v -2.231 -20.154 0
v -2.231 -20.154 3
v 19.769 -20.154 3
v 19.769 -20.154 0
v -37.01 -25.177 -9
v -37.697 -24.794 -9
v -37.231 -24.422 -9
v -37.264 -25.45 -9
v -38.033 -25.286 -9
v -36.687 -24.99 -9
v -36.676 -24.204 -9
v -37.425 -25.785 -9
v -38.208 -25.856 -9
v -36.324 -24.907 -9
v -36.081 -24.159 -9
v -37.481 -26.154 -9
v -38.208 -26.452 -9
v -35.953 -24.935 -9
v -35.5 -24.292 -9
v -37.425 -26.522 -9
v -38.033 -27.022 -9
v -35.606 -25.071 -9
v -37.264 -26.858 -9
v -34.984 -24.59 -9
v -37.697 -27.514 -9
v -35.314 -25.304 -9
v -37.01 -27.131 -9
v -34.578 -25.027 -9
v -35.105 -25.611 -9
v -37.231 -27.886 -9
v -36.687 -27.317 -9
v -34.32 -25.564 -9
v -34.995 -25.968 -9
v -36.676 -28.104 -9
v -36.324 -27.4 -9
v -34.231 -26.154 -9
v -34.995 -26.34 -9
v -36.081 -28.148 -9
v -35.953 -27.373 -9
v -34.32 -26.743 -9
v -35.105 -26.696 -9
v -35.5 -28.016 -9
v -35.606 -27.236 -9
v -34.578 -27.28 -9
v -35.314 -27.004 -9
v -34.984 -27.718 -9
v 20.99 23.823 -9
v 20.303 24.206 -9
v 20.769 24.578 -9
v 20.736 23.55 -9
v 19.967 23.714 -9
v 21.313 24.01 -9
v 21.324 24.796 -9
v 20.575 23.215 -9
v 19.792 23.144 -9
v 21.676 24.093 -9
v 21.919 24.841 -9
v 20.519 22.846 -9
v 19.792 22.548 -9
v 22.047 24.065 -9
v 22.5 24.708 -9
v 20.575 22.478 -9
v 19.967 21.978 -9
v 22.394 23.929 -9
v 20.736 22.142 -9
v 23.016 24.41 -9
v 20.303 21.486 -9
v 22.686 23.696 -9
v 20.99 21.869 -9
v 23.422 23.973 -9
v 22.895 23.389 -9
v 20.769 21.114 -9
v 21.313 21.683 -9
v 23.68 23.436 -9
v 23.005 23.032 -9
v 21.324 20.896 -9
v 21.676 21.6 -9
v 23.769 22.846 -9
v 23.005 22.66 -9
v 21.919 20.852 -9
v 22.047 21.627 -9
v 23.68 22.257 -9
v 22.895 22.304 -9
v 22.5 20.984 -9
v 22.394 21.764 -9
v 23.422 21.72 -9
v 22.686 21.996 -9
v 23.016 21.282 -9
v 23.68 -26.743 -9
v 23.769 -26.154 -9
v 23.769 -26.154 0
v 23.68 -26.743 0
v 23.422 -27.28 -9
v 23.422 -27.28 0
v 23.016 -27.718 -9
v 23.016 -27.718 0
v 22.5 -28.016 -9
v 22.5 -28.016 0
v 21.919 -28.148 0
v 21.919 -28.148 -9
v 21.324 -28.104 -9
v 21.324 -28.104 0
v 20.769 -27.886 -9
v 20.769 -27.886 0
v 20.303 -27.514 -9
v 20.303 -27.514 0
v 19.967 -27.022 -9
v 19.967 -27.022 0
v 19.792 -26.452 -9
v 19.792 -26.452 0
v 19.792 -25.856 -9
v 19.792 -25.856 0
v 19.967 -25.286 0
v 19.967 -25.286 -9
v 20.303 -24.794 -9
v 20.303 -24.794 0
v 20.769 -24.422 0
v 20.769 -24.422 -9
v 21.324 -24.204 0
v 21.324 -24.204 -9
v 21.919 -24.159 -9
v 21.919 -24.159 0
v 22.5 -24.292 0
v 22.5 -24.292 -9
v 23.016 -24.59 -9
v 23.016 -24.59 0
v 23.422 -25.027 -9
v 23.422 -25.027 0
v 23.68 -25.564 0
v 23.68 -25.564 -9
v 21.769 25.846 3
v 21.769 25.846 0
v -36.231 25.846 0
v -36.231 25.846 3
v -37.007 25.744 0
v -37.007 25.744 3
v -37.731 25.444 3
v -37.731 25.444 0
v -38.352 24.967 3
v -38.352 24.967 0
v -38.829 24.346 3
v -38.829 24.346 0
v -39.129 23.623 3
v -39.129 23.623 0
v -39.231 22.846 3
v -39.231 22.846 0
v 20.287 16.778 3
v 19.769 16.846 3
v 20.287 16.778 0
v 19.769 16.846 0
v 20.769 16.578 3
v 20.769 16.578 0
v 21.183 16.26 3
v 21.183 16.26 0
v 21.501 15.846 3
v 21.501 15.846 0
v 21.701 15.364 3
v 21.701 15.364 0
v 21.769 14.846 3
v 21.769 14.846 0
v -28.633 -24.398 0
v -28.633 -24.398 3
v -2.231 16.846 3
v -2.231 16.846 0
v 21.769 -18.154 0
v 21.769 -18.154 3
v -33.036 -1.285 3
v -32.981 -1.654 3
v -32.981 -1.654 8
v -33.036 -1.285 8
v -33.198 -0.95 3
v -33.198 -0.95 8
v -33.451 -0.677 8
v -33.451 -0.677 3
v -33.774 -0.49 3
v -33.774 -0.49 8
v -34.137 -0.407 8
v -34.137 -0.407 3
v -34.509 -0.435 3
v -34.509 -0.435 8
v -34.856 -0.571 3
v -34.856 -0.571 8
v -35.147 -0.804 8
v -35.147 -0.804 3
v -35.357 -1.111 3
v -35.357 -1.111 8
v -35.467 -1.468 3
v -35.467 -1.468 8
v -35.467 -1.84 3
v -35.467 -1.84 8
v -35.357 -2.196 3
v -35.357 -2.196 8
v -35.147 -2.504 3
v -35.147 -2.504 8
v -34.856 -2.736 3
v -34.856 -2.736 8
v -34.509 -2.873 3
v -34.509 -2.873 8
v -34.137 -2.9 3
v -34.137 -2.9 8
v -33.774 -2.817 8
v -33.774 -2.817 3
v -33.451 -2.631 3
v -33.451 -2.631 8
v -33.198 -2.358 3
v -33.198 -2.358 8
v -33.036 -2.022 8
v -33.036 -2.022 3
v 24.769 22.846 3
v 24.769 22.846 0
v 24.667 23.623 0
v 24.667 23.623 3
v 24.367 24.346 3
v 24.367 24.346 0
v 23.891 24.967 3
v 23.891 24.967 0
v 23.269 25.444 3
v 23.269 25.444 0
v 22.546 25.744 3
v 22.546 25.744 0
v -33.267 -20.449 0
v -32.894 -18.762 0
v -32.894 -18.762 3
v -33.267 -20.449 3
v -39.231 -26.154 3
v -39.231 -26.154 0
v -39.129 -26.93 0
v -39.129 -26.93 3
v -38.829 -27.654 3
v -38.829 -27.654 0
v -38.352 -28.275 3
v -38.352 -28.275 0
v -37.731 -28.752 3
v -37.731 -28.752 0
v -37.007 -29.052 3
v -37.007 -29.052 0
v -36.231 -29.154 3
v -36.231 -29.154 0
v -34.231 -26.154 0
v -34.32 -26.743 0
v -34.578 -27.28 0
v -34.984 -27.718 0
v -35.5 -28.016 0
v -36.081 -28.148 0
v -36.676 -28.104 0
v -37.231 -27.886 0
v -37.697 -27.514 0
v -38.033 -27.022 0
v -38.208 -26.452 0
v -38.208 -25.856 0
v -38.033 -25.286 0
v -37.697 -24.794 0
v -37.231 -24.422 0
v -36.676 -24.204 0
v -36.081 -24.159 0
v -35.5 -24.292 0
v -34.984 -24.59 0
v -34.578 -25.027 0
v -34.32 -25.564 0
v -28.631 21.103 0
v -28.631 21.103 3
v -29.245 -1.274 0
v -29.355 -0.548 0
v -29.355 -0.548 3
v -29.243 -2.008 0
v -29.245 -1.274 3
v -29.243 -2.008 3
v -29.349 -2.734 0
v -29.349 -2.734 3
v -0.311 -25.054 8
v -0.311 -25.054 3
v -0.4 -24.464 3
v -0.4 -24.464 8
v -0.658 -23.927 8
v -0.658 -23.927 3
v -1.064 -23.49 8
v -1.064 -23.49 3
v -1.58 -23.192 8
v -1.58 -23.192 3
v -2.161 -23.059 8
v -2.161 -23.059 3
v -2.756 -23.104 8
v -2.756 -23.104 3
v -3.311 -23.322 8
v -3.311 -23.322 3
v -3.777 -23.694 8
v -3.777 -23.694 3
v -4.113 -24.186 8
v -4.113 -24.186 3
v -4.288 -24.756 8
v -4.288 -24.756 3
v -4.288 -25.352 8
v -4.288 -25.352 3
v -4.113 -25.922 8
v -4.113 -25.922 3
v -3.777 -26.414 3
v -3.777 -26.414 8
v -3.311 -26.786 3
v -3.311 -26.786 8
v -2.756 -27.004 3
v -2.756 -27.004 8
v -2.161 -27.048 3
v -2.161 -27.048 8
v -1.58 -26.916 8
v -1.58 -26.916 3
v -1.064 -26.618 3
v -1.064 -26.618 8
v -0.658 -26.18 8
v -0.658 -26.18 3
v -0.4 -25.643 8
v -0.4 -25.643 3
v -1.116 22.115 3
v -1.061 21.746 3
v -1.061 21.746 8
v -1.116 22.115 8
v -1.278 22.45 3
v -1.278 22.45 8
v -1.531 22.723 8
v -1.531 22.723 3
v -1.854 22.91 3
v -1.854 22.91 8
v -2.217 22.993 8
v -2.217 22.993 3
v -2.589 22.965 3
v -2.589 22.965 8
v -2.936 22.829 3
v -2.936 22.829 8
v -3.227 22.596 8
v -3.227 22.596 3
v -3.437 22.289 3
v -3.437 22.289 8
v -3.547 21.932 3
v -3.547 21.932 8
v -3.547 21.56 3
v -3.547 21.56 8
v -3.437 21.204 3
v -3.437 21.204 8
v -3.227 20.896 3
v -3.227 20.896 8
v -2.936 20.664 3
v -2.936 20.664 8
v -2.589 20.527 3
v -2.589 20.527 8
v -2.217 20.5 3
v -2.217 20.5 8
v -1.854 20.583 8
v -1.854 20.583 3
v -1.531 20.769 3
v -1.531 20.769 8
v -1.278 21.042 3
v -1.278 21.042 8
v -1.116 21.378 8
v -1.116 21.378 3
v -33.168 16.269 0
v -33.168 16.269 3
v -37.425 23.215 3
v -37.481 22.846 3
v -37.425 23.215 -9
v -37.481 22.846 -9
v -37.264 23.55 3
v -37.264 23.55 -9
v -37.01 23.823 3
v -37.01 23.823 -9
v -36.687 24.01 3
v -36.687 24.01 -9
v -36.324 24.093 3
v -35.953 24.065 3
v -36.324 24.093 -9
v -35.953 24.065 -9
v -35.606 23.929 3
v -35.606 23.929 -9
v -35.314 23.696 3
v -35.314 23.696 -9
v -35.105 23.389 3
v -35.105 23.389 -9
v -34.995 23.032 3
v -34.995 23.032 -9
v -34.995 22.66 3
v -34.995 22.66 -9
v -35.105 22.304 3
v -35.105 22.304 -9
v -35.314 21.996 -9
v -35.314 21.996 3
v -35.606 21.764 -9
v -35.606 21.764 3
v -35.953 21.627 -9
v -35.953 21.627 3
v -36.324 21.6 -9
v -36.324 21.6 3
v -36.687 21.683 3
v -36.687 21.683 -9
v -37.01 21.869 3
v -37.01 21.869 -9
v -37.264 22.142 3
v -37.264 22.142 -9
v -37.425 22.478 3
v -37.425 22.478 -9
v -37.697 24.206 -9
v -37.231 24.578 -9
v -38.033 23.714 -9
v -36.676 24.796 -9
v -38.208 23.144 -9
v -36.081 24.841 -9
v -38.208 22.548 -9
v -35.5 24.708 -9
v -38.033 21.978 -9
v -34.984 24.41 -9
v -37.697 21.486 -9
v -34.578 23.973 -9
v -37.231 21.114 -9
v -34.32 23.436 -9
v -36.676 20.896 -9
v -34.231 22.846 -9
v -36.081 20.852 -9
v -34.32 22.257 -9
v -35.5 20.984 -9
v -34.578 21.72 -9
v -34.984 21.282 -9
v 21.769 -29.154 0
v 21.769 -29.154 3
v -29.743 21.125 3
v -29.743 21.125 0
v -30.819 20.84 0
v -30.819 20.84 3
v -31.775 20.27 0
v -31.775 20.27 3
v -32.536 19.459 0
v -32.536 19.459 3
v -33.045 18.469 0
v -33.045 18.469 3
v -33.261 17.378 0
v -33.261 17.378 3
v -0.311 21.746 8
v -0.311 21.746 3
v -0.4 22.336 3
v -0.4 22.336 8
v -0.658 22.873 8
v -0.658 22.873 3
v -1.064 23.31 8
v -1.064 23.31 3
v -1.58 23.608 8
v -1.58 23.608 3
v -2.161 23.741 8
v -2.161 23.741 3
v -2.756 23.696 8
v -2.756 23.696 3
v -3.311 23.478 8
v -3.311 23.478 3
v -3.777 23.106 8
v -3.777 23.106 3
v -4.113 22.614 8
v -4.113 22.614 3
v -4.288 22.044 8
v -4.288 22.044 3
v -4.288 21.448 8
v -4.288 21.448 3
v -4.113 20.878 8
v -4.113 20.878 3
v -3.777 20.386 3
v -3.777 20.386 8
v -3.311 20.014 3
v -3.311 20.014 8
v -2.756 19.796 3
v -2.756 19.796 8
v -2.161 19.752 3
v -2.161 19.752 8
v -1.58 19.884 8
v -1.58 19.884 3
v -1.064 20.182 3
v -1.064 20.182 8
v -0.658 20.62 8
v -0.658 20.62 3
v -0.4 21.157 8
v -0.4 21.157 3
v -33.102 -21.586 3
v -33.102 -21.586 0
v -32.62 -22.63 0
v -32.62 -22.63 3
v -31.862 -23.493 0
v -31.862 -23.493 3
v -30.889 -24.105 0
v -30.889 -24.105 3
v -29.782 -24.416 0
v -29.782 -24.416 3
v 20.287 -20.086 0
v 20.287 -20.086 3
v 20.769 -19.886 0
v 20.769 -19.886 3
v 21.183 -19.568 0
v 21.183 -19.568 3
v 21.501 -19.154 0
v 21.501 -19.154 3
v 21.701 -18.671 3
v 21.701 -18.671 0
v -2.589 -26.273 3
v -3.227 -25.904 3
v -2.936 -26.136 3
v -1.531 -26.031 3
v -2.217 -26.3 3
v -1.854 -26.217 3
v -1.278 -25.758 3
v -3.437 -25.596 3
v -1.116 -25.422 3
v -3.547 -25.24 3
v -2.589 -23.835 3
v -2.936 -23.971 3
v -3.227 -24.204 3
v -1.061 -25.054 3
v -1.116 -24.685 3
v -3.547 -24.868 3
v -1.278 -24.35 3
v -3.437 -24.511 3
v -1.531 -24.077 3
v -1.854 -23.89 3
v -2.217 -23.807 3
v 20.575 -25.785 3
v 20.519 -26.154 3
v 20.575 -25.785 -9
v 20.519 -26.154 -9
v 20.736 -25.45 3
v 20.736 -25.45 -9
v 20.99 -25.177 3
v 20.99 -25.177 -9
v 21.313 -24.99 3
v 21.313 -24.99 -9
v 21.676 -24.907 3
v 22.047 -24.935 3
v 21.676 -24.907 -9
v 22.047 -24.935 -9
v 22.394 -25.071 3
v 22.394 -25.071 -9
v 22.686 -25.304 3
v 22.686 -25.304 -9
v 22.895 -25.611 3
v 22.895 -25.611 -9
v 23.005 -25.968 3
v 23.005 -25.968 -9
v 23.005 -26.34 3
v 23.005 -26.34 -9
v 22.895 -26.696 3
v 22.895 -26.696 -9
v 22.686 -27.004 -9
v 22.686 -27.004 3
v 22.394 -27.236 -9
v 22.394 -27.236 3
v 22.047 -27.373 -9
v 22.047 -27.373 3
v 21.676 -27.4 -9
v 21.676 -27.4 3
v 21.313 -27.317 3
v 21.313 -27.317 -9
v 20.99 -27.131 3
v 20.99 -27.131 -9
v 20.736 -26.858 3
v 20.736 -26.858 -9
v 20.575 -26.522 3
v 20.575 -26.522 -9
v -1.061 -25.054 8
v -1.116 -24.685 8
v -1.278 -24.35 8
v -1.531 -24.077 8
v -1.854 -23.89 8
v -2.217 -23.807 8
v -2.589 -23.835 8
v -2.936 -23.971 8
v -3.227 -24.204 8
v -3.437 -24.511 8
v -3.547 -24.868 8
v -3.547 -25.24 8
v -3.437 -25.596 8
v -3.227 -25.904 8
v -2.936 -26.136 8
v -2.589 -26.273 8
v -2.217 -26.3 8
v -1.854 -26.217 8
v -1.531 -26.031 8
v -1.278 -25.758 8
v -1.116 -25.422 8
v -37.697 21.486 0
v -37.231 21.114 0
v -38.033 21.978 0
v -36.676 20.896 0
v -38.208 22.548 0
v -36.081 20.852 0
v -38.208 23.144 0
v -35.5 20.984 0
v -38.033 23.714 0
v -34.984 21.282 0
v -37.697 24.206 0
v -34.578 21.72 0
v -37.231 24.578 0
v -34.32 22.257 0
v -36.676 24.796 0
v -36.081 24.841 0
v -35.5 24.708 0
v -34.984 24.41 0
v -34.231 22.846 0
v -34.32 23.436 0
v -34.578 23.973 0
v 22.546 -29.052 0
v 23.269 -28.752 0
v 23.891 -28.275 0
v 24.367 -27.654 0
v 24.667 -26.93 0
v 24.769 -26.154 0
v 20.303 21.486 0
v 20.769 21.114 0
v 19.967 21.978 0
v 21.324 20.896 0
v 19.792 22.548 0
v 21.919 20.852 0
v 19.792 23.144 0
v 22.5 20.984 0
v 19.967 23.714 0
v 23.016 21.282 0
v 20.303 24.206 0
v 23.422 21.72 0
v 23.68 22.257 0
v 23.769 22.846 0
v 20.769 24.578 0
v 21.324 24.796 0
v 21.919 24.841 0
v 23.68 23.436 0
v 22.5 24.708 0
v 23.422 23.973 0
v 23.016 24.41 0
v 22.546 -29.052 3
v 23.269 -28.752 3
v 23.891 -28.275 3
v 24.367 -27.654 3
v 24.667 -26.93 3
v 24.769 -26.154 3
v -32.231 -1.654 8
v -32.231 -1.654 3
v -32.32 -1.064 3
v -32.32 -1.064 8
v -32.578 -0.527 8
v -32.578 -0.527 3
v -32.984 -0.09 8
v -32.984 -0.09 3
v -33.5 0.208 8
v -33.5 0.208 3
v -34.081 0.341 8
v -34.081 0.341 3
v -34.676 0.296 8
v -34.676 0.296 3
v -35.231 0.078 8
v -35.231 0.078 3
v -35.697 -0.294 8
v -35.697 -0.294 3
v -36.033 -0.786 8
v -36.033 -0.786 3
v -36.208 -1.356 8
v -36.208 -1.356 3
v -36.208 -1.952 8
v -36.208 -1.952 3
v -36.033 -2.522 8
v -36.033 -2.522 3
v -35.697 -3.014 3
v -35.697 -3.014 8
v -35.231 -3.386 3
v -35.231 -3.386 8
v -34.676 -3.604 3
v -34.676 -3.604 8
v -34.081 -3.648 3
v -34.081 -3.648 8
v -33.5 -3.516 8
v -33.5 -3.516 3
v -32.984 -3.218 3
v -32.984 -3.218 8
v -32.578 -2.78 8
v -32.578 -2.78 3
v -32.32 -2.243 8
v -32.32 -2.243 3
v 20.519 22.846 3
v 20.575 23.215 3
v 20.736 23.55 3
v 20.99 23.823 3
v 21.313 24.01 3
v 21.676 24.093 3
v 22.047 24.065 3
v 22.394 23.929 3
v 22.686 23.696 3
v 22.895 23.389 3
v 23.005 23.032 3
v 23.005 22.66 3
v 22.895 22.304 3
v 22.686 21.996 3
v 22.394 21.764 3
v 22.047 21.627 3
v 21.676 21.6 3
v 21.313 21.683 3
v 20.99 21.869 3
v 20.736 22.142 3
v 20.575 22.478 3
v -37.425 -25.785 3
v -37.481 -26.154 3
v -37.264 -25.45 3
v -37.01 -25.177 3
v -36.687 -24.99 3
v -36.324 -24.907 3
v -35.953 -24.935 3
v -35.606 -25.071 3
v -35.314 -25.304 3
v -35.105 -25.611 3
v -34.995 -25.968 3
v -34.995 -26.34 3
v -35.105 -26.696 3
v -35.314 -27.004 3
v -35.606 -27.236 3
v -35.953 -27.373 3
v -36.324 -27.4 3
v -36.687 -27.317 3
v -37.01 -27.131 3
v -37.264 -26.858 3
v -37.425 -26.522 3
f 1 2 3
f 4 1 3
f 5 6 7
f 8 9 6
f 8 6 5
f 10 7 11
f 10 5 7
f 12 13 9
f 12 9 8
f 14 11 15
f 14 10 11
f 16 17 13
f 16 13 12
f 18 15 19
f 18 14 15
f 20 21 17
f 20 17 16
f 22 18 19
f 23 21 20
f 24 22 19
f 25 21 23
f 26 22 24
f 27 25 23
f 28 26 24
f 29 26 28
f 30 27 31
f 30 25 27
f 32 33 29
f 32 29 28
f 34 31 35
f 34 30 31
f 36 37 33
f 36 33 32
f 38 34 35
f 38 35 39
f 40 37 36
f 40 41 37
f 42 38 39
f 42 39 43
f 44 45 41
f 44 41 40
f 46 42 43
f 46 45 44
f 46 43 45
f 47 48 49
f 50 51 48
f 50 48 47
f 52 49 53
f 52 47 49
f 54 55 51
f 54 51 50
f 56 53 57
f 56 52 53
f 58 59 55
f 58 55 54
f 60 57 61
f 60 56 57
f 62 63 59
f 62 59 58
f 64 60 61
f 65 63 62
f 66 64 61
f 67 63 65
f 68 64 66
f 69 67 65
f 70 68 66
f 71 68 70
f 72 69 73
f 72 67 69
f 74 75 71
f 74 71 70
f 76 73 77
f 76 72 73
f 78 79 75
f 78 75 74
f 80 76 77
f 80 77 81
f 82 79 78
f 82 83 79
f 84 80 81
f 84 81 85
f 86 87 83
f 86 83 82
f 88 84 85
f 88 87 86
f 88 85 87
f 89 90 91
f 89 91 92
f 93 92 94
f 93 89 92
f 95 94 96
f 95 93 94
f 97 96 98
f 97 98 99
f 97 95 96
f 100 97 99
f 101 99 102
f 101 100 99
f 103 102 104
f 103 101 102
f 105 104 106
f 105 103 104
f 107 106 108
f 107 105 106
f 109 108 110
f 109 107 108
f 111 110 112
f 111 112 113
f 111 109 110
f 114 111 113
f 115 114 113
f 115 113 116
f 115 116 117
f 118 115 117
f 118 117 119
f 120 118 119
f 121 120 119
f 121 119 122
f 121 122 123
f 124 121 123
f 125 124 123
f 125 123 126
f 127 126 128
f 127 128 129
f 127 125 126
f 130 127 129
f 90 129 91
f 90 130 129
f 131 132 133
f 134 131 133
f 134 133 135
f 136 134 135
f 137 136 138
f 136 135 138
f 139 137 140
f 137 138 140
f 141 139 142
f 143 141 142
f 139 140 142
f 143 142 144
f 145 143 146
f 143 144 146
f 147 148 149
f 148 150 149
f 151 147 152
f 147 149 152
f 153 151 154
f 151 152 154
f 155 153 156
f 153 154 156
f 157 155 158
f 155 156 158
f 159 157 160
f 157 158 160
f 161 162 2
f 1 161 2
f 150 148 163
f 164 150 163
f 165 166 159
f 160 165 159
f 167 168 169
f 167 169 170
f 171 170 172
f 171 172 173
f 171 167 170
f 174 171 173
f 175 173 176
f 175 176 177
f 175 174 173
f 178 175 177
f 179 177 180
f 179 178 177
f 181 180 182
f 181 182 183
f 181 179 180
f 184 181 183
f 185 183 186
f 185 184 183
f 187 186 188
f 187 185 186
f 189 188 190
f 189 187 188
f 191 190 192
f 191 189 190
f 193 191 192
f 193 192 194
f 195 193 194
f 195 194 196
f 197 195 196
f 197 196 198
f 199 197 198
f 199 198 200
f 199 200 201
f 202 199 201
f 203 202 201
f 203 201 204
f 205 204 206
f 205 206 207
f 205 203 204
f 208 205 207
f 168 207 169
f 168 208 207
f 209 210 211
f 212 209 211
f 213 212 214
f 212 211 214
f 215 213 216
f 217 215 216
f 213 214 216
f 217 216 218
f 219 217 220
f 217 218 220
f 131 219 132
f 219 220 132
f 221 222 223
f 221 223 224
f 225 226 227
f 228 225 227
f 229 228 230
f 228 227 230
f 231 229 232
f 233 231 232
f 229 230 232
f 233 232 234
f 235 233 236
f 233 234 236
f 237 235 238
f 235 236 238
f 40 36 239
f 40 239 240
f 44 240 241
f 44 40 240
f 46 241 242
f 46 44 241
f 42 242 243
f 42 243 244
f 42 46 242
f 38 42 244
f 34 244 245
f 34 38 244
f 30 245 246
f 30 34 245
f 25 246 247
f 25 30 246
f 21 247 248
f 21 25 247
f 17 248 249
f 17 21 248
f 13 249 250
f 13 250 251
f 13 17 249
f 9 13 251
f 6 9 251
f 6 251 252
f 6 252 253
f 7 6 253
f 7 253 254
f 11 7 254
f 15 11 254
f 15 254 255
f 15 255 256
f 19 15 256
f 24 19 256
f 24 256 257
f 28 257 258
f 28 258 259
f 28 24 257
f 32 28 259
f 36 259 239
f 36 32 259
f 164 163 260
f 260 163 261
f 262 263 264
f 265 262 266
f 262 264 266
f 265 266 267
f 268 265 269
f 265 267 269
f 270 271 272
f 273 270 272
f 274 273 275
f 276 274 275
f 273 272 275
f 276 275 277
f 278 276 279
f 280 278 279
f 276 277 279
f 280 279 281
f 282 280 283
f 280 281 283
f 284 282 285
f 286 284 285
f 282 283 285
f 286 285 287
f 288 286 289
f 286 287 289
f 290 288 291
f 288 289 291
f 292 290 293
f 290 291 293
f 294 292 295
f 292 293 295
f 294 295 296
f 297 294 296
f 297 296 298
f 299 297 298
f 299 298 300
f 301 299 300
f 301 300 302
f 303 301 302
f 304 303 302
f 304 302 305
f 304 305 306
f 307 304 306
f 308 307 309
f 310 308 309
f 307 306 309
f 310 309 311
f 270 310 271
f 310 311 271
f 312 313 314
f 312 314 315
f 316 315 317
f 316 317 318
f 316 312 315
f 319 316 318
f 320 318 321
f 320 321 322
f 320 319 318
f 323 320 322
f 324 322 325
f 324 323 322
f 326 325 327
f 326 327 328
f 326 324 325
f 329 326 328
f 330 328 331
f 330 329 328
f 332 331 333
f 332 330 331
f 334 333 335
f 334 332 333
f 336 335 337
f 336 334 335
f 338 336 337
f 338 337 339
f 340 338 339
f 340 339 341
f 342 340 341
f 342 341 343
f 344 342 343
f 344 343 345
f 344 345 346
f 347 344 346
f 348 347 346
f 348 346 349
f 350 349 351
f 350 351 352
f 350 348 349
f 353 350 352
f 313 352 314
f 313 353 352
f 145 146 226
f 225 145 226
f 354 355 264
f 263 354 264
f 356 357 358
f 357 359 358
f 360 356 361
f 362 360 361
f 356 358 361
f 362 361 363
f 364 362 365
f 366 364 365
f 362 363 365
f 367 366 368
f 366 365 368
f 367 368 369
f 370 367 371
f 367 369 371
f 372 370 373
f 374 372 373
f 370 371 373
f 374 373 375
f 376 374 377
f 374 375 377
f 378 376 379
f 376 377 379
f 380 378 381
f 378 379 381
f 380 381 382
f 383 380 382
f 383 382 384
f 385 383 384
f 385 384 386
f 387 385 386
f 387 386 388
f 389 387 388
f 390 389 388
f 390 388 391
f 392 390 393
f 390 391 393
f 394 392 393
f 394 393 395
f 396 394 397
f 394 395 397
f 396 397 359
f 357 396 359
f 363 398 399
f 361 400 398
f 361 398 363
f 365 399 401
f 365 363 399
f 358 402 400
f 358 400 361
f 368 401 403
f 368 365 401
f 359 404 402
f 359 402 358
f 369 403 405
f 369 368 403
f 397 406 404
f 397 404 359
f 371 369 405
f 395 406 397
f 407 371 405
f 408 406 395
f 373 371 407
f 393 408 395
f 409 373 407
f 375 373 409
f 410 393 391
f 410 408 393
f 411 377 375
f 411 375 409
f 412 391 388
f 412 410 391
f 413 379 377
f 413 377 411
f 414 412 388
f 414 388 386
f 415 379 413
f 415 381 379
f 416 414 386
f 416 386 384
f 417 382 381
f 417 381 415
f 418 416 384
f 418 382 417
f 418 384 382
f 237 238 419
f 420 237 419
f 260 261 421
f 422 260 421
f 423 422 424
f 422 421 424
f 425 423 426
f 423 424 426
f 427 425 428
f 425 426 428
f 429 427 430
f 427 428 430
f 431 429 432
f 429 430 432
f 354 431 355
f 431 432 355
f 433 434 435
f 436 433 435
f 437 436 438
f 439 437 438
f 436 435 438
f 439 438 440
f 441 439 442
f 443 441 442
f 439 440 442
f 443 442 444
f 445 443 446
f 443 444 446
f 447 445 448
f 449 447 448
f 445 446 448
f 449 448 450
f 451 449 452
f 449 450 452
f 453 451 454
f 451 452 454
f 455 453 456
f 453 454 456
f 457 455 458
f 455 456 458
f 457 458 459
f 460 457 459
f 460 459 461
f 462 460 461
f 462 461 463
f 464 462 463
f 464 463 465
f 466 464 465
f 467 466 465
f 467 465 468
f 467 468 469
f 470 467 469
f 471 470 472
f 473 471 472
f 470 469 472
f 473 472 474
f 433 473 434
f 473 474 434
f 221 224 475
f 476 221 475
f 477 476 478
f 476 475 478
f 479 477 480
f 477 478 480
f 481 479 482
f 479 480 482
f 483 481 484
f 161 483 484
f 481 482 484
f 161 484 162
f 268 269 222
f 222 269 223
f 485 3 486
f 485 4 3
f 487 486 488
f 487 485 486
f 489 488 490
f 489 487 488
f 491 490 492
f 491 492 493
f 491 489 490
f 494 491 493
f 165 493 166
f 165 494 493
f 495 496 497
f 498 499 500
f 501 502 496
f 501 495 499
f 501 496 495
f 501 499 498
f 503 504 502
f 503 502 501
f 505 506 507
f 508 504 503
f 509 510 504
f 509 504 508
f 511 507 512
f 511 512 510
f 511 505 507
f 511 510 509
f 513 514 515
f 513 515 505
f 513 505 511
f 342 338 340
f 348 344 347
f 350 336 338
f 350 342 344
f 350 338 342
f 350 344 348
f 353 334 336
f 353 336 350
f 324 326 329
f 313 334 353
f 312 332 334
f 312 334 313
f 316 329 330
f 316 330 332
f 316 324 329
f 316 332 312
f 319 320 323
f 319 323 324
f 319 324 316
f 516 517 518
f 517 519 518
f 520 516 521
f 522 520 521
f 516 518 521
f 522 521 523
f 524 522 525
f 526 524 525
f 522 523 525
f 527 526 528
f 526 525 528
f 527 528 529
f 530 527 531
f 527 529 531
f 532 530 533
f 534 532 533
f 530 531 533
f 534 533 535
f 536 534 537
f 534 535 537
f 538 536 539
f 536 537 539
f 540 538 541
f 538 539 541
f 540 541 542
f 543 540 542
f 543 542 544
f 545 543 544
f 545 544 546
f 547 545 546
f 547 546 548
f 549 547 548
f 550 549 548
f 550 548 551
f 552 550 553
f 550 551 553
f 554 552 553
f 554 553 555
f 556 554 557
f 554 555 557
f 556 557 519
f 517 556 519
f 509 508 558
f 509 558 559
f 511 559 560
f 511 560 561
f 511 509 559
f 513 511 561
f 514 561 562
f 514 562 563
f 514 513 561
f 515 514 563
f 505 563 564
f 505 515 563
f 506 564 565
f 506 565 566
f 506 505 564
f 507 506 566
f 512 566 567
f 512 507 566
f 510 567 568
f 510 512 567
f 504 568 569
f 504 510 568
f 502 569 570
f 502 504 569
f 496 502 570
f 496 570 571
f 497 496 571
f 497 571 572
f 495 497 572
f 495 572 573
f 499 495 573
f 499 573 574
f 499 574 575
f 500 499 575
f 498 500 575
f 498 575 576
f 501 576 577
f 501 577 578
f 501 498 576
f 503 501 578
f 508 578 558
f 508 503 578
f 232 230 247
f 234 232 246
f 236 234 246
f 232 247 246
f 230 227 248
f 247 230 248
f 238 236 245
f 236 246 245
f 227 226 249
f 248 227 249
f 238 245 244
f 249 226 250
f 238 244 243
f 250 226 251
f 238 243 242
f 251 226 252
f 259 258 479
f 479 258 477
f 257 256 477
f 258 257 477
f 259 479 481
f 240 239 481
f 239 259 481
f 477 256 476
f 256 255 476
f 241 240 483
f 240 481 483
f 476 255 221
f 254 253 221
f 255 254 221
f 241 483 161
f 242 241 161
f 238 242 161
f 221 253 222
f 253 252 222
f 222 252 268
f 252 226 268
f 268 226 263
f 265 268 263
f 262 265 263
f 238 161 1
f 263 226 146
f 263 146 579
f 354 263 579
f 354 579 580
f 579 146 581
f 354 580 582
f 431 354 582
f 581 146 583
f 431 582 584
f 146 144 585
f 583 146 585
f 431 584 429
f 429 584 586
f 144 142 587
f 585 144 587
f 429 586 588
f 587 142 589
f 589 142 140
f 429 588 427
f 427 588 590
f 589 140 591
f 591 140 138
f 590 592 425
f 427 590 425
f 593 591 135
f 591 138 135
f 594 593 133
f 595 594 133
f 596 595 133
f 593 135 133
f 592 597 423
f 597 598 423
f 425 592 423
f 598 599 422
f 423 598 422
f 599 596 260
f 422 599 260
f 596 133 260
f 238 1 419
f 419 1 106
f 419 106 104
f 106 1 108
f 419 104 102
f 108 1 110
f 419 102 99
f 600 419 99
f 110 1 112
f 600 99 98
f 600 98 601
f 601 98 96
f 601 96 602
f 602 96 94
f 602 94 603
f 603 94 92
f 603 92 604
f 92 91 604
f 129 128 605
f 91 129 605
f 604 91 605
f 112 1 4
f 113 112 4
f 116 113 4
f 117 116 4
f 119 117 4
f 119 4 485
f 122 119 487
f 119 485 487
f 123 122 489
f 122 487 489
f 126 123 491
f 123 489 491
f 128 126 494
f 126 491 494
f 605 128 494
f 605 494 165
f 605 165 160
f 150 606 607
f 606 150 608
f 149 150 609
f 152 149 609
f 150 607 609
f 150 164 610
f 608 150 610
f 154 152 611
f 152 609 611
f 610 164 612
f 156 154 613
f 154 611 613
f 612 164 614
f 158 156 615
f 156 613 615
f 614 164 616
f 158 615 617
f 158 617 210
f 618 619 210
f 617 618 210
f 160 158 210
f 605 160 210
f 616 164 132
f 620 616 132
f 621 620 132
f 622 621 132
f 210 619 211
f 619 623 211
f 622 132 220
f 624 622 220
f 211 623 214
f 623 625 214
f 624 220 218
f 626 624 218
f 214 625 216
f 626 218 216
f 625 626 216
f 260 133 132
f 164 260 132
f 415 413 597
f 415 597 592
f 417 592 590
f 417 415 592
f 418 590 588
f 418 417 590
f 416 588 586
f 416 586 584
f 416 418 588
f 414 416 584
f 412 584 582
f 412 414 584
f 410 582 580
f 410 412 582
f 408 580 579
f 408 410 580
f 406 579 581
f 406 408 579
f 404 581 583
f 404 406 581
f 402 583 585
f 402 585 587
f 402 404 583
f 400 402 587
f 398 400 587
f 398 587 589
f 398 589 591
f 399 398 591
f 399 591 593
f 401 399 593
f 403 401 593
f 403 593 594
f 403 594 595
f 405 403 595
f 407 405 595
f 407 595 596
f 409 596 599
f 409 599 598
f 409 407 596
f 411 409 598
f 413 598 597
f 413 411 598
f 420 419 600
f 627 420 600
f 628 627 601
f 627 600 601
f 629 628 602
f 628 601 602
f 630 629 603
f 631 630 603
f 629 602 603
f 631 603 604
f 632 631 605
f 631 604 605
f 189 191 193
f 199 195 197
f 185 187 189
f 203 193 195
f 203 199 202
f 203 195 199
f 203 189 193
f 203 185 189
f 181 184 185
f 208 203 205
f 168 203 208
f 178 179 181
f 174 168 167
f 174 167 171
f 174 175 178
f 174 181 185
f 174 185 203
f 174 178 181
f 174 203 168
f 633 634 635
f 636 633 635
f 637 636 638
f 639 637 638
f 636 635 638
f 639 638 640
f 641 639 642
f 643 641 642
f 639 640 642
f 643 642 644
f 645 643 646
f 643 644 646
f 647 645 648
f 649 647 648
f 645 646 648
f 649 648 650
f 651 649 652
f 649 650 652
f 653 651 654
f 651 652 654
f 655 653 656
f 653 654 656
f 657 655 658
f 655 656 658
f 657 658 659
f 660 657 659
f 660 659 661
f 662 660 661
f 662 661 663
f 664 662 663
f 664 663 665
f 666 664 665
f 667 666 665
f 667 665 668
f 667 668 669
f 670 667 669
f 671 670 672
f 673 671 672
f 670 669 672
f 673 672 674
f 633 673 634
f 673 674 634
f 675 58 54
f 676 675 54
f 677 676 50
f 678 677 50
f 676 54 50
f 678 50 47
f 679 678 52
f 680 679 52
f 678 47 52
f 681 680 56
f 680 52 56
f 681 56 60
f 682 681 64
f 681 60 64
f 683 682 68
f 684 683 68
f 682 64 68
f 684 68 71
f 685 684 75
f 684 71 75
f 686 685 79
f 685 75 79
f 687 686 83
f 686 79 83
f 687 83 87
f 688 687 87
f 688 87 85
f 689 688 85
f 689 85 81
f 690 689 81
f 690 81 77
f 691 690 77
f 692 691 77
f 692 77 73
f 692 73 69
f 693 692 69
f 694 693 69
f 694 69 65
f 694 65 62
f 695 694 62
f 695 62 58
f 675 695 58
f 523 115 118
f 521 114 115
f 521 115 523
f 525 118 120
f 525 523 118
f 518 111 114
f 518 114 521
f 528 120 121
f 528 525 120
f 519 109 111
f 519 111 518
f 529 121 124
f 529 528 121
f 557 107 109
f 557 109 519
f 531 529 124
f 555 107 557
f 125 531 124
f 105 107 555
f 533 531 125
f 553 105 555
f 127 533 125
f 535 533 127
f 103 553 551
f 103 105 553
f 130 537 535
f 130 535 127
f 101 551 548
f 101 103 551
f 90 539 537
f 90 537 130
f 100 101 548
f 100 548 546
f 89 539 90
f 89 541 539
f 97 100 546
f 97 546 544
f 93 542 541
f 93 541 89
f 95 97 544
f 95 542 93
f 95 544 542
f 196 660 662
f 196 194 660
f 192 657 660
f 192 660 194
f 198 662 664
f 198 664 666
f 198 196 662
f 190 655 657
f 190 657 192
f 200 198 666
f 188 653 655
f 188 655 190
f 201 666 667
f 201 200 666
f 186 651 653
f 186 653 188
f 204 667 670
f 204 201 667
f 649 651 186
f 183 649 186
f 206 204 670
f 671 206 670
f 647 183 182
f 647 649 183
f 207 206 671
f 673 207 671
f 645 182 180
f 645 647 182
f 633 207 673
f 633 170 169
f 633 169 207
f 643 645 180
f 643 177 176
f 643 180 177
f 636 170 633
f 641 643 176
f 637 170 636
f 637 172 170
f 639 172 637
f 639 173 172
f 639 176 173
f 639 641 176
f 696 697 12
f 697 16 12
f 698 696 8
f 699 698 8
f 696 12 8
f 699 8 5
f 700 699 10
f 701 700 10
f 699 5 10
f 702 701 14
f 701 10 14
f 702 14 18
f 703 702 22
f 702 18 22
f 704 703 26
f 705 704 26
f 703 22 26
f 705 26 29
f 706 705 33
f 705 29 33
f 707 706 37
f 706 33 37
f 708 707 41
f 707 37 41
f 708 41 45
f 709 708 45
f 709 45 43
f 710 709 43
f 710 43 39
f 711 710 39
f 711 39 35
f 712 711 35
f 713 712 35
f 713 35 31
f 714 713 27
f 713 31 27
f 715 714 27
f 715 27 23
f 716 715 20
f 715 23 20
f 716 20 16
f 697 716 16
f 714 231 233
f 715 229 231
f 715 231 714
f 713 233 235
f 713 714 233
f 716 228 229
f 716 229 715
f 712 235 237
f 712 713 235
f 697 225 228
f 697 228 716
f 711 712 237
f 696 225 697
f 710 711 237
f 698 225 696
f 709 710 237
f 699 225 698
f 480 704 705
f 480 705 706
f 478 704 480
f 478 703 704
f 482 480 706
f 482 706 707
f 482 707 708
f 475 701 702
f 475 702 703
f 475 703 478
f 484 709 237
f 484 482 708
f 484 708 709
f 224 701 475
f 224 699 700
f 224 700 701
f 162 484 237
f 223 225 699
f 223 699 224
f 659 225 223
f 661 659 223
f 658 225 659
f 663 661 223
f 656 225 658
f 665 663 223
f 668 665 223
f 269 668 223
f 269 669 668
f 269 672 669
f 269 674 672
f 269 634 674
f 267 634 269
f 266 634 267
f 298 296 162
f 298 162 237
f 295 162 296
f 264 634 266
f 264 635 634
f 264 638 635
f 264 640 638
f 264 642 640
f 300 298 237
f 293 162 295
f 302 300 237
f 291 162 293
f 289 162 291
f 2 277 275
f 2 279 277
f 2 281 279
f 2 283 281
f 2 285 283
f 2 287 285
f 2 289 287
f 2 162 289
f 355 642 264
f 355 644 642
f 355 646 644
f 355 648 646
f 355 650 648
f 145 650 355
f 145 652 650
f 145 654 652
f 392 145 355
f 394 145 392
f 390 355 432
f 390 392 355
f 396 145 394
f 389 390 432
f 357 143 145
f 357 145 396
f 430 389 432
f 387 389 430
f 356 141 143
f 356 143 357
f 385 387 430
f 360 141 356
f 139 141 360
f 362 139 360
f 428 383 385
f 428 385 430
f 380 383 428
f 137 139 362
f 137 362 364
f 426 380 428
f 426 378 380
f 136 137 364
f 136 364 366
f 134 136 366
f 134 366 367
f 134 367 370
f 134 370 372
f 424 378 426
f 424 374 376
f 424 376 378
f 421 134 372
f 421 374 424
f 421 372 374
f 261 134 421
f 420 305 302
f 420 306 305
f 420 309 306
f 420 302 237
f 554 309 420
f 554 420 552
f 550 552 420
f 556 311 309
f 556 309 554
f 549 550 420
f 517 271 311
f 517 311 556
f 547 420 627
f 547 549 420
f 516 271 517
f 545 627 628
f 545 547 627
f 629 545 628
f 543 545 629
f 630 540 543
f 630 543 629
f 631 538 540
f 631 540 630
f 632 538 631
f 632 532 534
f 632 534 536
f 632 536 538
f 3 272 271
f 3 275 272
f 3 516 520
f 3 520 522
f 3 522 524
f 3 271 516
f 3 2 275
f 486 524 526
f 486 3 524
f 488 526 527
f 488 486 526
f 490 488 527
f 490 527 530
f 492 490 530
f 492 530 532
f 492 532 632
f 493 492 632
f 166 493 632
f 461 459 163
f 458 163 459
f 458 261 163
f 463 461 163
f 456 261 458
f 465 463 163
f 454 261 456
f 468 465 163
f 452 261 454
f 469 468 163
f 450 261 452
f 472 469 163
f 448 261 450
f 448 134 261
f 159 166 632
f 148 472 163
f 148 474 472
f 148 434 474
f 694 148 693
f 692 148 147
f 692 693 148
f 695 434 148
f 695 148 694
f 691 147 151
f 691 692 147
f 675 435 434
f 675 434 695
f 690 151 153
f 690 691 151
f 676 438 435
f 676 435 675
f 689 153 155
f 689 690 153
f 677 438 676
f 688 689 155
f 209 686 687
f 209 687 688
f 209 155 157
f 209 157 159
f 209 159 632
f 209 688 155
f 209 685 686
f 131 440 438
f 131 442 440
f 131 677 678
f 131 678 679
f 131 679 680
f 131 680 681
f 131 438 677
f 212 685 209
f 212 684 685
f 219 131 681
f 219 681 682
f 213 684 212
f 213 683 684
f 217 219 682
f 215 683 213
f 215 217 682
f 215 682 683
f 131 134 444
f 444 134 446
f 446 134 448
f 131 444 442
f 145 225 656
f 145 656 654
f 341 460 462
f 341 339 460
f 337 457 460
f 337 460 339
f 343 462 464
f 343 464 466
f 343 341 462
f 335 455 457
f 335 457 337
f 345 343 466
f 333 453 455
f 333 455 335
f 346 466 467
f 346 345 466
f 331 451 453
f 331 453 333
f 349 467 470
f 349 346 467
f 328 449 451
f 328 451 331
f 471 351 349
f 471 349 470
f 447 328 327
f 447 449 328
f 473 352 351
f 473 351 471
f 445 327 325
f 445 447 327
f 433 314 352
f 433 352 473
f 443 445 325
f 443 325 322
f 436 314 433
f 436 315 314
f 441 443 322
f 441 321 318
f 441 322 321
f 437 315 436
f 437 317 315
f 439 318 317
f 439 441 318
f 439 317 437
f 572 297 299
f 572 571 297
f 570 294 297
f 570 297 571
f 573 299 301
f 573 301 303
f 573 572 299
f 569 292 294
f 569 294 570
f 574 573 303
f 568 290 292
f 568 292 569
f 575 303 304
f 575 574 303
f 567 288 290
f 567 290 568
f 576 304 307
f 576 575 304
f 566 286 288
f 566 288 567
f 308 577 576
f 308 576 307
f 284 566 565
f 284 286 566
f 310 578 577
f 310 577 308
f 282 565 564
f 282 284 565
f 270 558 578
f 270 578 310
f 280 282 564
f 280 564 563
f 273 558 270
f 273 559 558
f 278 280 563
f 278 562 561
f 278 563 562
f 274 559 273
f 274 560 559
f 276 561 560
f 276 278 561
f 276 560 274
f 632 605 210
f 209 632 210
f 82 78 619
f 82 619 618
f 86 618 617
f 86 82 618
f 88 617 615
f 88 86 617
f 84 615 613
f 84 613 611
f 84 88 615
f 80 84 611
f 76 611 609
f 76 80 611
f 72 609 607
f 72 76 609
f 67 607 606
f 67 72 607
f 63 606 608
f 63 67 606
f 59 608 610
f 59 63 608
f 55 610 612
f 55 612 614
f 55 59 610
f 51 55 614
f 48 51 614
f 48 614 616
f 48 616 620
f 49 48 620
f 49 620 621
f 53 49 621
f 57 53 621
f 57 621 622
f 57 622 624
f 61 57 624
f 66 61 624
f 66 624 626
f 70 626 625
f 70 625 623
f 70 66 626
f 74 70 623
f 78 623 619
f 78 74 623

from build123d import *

# Parameters (mm, degrees)
SALIENTE_EXTRUIR2_DEPTH = 3
CROQUIS2_R              = 1.25
CORTAR_EXTRUIR4_DEPTH   = 5
SALIENTE_EXTRUIR5_START = 9
CROQUIS6_R              = 2
CROQUIS6_R_2            = 1.25
SALIENTE_EXTRUIR5_DEPTH = 9
CROQUIS4_R              = 2
CROQUIS4_R_2            = 1.25
SALIENTE_EXTRUIR4_DEPTH = 5
CORTAR_EXTRUIR5_DEPTH   = 7
REDONDEO1_R             = 2


with BuildPart() as part:
    # Croquis1 → Saliente-Extruir2 (new body)
    with BuildSketch(Plane.XY):
        with BuildLine():
            Line((21.769230769, 25.846153846), (-36.230769231, 25.846153846))
            ThreePointArc((-36.230769231, 25.846153846), (-38.352089574, 24.96747419), (-39.230769231, 22.846153846))
            Line((-39.230769231, 22.846153846), (-39.230769231, -26.153846154))
            ThreePointArc((-39.230769231, -26.153846154), (-38.352089574, -28.275166497), (-36.230769231, -29.153846154))
            Line((-36.230769231, -29.153846154), (21.769230769, -29.153846154))
            ThreePointArc((21.769230769, -29.153846154), (23.890551113, -28.275166497), (24.769230769, -26.153846154))
            Line((24.769230769, -26.153846154), (24.769230769, 22.846153846))
            ThreePointArc((24.769230769, 22.846153846), (23.890551113, 24.96747419), (21.769230769, 25.846153846))
        make_face()
    extrude(amount=SALIENTE_EXTRUIR2_DEPTH)

    # Croquis2 → Cortar-Extruir4 (cut)
    with BuildSketch(Plane(origin=(0, 0, 0), x_dir=(-1, 0, 0), z_dir=(0, 0, -1))):
        with Locations((-21.769230769, 22.846153846)):
            Circle(CROQUIS2_R)
        with Locations((36.230769231, 22.846153846)):
            Circle(CROQUIS2_R)
        with Locations((36.230769231, -26.153846154)):
            Circle(CROQUIS2_R)
        with Locations((-21.769230769, -26.153846154)):
            Circle(CROQUIS2_R)
    extrude(amount=-CORTAR_EXTRUIR4_DEPTH, mode=Mode.SUBTRACT)

    # Croquis6 → Saliente-Extruir5 (add)
    # profile 1 of 4: a face of its own
    with BuildSketch(Plane(origin=(0, 0, 0), x_dir=(-1, 0, 0), z_dir=(0, 0, -1)).offset(SALIENTE_EXTRUIR5_START)):
        with Locations(Location((-21.769230769, 22.846153846, 0), (0, 0, 180))):
            Circle(CROQUIS6_R)
        with Locations((-21.769230769, 22.846153846)):
            Circle(CROQUIS6_R_2, mode=Mode.SUBTRACT)
    # profile 2 of 4: a face of its own
    with BuildSketch(Plane(origin=(0, 0, 0), x_dir=(-1, 0, 0), z_dir=(0, 0, -1)).offset(SALIENTE_EXTRUIR5_START)):
        with Locations(Location((36.230769231, 22.846153846, 0), (0, 0, 180))):
            Circle(CROQUIS6_R)
        with Locations((36.230769231, 22.846153846)):
            Circle(CROQUIS6_R_2, mode=Mode.SUBTRACT)
    # profile 3 of 4: a face of its own
    with BuildSketch(Plane(origin=(0, 0, 0), x_dir=(-1, 0, 0), z_dir=(0, 0, -1)).offset(SALIENTE_EXTRUIR5_START)):
        with Locations(Location((36.230769231, -26.153846154, 0), (0, 0, 180))):
            Circle(CROQUIS6_R)
        with Locations((36.230769231, -26.153846154)):
            Circle(CROQUIS6_R_2, mode=Mode.SUBTRACT)
    # profile 4 of 4: a face of its own
    with BuildSketch(Plane(origin=(0, 0, 0), x_dir=(-1, 0, 0), z_dir=(0, 0, -1)).offset(SALIENTE_EXTRUIR5_START)):
        with Locations(Location((-21.769230769, -26.153846154, 0), (0, 0, 180))):
            Circle(CROQUIS6_R)
        with Locations((-21.769230769, -26.153846154)):
            Circle(CROQUIS6_R_2, mode=Mode.SUBTRACT)
    extrude(amount=-SALIENTE_EXTRUIR5_DEPTH)

    # Croquis4 → Saliente-Extruir4 (add)
    # profile 1 of 3: a face of its own
    with BuildSketch(Plane.XY.offset(3)):
        with Locations((-34.230769231, -1.653846154)):
            Circle(CROQUIS4_R)
        with Locations((-34.230769231, -1.653846154)):
            Circle(CROQUIS4_R_2, mode=Mode.SUBTRACT)
    # profile 2 of 3: a face of its own
    with BuildSketch(Plane.XY.offset(3)):
        with Locations((-2.310769231, 21.746153846)):
            Circle(CROQUIS4_R)
        with Locations((-2.310769231, 21.746153846)):
            Circle(CROQUIS4_R_2, mode=Mode.SUBTRACT)
    # profile 3 of 3: a face of its own
    with BuildSketch(Plane.XY.offset(3)):
        with Locations((-2.310769231, -25.053846154)):
            Circle(CROQUIS4_R)
        with Locations((-2.310769231, -25.053846154)):
            Circle(CROQUIS4_R_2, mode=Mode.SUBTRACT)
    extrude(amount=SALIENTE_EXTRUIR4_DEPTH)

    # Croquis5 → Cortar-Extruir5 (cut)
    with BuildSketch(Plane.XY.offset(3)):
        with BuildLine():
            Line((21.769230769, 16.846153846), (-2.230769231, 16.846153846))
            Line((-2.230769231, 16.846153846), (-28.630769231, 21.10260022))
            ThreePointArc((-28.630769231, 21.10260022), (-32.183785013, 19.891309577), (-33.168405876, 16.268925289))
            Line((-33.168405876, 16.268925289), (-29.35459073, -0.548005648))
            ThreePointArc((-29.35459073, -0.548005648), (-29.230786857, -1.640569852), (-29.34878692, -2.733776112))
            Line((-29.34878692, -2.733776112), (-32.894263486, -18.761624723))
            Line((-32.894263486, -18.761624723), (-33.267463075, -20.448728388))
            ThreePointArc((-33.267463075, -20.448728388), (-31.861740508, -23.49335063), (-28.632600775, -24.398025776))
            Line((-28.632600775, -24.398025776), (-2.230769231, -20.153846154))
            Line((-2.230769231, -20.153846154), (21.769230769, -20.153846154))
            Line((21.769230769, -20.153846154), (21.769230769, 16.846153846))
        make_face()
    extrude(amount=-CORTAR_EXTRUIR5_DEPTH, mode=Mode.SUBTRACT)

    # Redondeo1
    redondeo1_edges = [part.edges().sort_by_distance(p)[0] for p in [
        (21.769230769, 16.846153846, 1.5),
        (21.769230769, -20.153846154, 1.5),
    ]]
    fillet(redondeo1_edges, radius=REDONDEO1_R)


solid = part.part
